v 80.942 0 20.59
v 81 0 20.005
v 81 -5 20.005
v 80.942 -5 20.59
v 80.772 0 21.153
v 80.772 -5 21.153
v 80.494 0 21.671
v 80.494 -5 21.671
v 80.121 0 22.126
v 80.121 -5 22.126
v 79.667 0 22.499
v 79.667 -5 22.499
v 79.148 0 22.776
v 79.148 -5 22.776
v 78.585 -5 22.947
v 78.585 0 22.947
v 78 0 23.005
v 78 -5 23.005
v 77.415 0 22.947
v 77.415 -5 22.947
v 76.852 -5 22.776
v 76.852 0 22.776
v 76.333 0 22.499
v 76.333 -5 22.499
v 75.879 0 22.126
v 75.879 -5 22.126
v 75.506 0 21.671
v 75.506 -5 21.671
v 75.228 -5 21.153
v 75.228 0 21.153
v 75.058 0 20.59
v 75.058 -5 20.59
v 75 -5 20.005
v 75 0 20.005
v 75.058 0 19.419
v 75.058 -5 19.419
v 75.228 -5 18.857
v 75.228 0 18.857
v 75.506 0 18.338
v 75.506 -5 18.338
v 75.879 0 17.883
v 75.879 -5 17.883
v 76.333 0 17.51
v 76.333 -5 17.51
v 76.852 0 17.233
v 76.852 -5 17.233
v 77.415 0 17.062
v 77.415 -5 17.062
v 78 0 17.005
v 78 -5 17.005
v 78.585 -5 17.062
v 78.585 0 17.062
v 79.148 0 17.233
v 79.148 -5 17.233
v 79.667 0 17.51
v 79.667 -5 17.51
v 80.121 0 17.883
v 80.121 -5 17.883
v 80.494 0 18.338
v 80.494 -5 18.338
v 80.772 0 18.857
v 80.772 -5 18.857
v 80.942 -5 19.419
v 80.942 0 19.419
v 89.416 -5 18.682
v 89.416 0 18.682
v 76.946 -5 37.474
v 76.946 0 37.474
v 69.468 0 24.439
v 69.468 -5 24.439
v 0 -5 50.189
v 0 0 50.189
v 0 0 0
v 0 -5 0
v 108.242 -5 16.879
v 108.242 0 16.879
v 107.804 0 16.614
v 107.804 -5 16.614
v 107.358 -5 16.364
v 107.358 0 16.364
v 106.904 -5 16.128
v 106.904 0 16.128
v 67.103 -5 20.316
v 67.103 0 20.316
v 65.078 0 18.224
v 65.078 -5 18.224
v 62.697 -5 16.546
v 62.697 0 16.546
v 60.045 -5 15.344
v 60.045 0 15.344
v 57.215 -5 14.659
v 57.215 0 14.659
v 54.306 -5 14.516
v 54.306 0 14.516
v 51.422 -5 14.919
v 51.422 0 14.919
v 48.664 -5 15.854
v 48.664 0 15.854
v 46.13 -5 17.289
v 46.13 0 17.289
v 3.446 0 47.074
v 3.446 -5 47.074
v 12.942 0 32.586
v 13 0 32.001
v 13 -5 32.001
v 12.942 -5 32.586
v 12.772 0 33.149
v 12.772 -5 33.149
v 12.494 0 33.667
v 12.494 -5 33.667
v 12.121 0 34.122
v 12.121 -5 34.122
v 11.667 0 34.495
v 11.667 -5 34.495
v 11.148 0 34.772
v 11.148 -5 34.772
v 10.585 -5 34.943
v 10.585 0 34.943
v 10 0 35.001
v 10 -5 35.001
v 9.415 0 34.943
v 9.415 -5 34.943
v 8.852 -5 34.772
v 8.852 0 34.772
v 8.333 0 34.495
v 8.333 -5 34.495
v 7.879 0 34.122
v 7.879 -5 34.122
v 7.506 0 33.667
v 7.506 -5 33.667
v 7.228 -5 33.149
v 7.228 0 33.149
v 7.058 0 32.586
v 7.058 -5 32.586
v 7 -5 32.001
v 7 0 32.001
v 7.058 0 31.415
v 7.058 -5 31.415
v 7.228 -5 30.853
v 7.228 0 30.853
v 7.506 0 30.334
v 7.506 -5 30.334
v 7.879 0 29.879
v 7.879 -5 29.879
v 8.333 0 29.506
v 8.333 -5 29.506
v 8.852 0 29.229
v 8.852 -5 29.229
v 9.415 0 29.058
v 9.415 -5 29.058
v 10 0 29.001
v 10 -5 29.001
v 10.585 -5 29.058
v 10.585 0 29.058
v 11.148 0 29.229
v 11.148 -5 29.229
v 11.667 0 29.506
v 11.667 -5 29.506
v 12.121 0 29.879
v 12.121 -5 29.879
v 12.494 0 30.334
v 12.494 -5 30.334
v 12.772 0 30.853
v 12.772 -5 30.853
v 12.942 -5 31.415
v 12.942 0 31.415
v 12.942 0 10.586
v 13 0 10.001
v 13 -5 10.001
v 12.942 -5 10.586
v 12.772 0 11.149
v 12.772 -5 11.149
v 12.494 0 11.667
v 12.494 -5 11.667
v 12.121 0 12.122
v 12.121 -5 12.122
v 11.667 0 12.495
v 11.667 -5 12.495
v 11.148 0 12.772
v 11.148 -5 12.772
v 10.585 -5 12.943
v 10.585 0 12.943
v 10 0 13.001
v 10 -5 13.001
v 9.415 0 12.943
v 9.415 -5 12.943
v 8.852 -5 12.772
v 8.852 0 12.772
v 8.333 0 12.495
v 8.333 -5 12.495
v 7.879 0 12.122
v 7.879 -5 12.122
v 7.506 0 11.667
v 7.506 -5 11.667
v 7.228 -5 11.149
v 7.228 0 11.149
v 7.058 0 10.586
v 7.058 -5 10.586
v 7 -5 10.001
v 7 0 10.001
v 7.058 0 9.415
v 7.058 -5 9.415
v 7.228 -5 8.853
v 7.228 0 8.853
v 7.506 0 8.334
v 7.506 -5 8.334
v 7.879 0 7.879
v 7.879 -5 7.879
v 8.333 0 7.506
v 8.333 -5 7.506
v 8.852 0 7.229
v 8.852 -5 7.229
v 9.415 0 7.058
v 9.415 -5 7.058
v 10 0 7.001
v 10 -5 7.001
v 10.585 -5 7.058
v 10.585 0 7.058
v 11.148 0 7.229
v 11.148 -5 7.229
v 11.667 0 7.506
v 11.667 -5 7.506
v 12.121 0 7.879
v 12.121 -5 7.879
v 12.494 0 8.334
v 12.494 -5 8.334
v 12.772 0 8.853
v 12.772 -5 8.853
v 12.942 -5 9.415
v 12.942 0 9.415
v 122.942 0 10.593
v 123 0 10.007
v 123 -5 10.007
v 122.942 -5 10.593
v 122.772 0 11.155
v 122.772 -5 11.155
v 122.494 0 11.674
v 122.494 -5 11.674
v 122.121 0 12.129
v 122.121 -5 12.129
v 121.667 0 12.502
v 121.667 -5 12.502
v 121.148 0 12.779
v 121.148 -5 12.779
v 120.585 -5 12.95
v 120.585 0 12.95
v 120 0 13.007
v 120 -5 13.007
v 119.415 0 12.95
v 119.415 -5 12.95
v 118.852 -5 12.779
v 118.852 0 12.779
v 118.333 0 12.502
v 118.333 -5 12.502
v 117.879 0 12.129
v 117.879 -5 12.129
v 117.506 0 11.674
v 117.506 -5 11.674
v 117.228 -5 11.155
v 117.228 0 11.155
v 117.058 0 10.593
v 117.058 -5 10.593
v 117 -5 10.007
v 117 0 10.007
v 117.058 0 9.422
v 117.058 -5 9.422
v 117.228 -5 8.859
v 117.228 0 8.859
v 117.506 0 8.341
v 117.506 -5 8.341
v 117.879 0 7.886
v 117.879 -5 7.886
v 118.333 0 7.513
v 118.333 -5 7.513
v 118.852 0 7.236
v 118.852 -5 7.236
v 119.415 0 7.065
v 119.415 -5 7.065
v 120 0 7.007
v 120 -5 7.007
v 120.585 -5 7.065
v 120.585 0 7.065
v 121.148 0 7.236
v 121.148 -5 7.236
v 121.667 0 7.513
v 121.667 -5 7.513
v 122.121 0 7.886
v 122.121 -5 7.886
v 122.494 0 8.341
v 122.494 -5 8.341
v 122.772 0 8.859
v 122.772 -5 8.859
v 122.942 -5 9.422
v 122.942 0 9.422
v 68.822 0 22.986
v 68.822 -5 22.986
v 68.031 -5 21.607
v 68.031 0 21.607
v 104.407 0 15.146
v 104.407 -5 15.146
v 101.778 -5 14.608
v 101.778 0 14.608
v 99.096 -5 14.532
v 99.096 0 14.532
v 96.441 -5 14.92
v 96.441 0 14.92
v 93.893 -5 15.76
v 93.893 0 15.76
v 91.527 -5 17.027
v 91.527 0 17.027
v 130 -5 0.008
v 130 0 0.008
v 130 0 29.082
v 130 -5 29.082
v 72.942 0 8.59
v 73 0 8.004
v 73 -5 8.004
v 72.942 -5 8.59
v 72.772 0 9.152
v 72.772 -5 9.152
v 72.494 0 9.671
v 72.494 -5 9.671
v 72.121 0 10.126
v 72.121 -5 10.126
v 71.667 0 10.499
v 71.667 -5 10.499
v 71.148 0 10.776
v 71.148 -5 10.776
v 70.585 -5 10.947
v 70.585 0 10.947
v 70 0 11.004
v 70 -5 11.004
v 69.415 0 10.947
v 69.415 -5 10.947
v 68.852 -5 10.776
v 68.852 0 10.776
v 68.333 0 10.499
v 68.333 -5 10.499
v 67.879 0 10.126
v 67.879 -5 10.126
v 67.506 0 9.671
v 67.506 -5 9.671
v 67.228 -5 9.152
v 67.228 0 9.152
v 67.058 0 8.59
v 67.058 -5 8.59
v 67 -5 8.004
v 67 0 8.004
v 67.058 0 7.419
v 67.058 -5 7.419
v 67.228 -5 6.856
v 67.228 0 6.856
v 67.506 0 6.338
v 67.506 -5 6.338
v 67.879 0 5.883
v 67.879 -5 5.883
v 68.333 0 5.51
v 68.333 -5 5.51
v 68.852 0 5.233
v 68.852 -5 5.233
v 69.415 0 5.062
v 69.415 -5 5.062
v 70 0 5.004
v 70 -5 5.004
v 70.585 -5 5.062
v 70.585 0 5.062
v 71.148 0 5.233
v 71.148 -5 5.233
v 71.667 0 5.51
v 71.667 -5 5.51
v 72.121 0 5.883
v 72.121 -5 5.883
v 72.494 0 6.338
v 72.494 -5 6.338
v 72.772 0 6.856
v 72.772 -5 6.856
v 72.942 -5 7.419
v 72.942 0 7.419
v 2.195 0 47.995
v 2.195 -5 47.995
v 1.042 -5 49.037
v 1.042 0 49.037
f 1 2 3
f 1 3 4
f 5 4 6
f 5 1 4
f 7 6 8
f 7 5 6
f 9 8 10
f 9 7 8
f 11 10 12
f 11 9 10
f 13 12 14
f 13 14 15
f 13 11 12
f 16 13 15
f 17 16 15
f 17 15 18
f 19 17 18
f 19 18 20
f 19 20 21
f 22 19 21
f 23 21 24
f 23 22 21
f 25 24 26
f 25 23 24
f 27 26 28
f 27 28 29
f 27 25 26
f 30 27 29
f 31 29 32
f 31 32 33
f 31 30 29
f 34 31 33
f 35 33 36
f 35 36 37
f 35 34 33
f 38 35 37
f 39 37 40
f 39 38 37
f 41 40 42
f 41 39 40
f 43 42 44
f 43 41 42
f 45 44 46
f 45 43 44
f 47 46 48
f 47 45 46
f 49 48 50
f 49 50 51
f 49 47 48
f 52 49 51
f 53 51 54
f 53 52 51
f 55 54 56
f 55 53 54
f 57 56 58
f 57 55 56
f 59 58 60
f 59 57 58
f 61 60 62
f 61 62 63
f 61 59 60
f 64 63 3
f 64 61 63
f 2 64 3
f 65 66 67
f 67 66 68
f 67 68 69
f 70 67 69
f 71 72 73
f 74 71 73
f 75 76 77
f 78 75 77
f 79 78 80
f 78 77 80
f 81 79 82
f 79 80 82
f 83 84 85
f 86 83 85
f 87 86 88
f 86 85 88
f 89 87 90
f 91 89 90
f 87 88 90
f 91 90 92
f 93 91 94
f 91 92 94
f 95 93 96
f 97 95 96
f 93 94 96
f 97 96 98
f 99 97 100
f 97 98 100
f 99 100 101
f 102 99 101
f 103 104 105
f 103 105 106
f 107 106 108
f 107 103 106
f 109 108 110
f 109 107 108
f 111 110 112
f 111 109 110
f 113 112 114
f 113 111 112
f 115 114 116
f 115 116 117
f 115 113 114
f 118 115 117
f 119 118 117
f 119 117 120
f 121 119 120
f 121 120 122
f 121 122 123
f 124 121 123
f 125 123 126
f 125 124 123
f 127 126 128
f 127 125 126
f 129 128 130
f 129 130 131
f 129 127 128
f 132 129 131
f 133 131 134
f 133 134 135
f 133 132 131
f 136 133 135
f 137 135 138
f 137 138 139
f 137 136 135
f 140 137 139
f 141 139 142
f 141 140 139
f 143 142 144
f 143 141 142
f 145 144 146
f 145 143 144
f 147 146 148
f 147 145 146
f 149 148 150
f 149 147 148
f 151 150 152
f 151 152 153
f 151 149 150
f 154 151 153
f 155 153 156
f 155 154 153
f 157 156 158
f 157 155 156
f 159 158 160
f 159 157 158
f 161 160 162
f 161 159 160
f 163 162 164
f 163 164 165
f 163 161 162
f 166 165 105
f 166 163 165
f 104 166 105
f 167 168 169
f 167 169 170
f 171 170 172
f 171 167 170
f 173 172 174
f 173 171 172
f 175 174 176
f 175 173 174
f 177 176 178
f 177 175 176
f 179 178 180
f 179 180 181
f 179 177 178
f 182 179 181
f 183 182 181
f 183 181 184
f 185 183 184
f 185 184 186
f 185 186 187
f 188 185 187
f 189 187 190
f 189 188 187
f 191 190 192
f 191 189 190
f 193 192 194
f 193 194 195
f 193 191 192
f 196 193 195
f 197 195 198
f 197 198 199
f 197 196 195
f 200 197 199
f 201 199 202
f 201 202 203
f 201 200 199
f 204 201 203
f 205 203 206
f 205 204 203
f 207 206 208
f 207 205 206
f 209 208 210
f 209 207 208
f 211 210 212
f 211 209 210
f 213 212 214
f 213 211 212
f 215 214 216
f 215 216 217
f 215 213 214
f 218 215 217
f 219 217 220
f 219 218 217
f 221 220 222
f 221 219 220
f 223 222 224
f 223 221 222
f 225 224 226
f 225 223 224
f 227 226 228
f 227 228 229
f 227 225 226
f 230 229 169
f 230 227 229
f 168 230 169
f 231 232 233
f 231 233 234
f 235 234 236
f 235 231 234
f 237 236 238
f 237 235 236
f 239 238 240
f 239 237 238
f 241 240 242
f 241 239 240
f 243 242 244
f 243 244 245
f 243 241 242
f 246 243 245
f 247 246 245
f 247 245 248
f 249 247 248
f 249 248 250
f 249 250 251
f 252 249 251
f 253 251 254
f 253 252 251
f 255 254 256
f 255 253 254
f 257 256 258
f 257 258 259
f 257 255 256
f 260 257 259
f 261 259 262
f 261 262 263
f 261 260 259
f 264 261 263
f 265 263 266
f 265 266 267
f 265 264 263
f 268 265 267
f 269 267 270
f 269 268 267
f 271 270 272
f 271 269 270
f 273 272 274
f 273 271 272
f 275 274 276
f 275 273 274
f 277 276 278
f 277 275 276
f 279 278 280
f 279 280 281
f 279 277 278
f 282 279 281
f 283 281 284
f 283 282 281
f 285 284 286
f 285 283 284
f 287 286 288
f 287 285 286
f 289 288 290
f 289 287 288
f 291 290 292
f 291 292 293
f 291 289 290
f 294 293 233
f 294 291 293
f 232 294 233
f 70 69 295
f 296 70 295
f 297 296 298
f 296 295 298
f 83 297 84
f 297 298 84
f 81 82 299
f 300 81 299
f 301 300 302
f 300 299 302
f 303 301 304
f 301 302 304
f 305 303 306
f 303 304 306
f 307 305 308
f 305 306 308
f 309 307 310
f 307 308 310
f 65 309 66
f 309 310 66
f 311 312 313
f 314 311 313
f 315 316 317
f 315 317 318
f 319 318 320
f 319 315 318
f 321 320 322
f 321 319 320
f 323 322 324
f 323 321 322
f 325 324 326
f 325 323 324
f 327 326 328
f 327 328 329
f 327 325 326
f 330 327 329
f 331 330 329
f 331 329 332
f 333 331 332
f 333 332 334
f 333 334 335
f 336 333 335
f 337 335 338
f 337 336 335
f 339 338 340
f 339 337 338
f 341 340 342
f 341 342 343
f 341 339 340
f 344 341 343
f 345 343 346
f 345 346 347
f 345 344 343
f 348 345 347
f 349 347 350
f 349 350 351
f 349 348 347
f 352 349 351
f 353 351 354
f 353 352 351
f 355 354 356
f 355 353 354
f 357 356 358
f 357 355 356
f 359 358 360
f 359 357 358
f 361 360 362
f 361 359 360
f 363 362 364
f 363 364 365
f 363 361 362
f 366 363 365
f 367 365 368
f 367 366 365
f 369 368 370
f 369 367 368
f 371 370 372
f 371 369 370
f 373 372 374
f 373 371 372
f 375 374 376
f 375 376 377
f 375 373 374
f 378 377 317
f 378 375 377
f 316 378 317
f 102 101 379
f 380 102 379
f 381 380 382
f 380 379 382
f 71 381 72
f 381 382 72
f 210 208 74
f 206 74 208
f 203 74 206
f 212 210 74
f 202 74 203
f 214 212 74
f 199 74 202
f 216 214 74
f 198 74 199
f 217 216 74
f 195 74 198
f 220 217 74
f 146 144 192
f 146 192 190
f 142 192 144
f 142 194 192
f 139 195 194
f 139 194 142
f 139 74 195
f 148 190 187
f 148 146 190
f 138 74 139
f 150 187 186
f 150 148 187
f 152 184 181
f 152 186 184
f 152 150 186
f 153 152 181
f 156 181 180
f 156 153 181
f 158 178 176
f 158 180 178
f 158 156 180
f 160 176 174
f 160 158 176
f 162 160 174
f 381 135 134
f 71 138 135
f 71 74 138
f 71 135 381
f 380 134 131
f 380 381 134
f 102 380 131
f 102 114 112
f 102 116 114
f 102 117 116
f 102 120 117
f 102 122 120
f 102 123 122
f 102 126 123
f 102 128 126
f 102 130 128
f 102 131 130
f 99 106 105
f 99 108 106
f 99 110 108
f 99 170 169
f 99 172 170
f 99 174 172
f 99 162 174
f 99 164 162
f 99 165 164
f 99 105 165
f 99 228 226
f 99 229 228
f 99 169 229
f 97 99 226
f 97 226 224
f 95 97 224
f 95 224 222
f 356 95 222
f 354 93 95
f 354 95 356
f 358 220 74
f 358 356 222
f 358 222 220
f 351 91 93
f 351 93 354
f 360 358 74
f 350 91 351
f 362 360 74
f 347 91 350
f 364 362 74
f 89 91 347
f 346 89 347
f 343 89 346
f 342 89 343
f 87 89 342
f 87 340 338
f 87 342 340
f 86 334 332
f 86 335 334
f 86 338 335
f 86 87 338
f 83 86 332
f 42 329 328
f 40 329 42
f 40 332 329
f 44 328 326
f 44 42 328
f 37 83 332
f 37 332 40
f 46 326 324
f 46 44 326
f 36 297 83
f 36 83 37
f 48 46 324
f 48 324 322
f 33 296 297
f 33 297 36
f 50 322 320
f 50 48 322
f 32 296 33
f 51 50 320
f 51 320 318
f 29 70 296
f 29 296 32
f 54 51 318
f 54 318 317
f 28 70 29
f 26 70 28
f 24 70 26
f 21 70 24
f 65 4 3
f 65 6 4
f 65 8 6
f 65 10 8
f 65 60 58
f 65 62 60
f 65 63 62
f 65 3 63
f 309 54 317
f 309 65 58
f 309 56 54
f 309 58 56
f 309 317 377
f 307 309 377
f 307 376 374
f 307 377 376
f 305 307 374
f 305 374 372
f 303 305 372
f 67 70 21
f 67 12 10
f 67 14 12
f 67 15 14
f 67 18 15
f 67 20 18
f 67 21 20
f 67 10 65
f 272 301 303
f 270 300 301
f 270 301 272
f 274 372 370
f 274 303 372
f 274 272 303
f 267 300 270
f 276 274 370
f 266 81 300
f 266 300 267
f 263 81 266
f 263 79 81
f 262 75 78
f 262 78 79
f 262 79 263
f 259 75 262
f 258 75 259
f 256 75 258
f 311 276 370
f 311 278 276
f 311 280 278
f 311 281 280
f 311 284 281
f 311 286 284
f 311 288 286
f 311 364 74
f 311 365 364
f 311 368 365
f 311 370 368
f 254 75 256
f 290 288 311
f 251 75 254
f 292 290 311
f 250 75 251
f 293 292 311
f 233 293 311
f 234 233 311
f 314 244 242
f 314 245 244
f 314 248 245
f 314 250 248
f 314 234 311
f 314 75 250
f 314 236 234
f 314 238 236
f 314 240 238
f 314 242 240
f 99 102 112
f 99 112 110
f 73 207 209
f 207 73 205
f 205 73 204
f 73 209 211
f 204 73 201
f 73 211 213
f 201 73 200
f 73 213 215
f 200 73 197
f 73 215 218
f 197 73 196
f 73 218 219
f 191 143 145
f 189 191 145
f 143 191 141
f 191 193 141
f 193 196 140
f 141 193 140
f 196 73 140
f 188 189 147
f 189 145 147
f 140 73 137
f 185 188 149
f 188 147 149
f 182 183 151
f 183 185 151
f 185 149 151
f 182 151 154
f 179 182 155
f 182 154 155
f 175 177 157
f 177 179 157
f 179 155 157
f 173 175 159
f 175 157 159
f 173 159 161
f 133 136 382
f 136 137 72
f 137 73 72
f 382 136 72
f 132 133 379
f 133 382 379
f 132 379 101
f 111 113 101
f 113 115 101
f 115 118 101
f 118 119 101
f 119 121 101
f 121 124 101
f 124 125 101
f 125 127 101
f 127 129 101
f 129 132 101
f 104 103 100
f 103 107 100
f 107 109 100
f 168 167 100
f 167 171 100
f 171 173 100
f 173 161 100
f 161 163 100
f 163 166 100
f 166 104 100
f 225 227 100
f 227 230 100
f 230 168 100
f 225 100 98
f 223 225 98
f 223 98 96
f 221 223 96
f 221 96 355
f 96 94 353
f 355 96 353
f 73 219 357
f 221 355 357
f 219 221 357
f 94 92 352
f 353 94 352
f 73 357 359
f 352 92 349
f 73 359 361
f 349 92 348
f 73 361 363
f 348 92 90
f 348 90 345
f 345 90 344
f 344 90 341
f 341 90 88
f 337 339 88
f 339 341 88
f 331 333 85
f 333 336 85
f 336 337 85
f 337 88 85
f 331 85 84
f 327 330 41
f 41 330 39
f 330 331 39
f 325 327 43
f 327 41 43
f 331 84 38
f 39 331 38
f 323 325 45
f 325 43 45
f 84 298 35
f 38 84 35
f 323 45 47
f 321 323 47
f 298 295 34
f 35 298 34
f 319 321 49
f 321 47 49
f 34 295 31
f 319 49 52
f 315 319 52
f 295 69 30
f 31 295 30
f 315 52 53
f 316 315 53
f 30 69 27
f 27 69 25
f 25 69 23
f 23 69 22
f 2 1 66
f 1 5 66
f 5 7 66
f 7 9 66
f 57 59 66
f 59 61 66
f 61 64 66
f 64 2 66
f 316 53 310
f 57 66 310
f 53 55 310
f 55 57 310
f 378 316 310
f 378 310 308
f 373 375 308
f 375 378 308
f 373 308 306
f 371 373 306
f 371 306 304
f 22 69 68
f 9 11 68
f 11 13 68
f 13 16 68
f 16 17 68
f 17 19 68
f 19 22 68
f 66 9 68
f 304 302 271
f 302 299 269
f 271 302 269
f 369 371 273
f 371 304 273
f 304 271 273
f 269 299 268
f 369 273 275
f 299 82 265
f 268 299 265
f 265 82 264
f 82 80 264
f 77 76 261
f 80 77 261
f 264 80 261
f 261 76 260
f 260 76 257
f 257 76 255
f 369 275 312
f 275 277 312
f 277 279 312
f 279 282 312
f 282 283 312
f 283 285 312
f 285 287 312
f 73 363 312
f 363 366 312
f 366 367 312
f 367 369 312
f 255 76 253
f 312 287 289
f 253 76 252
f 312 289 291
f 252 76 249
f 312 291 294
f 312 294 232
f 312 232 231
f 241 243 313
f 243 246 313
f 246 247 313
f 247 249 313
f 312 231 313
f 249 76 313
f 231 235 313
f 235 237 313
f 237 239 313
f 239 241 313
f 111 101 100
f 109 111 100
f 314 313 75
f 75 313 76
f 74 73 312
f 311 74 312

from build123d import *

# Parameters (mm, degrees)
F0_R     = 3
F1_DEPTH = 5


with BuildPart() as f1:
    # F0 (on Front) → F1 (new body)
    with BuildSketch(Plane.XZ):
        with BuildLine():
            Line((0, 50.189292), (0, 0))
            Line((0, 0), (130, 0.007858))
            Line((130, 0.007858), (130, 29.081571))
            Line((130, 29.081571), (108.241631, 16.878763))
            ThreePointArc((108.241631, 16.878763), (107.581922, 16.487004), (106.903636, 16.128371))
            ThreePointArc((106.903636, 16.128371), (97.760054, 14.668749), (89.415819, 18.682392))
            Line((89.415819, 18.682392), (76.946103, 37.473632))
            Line((76.946103, 37.473632), (69.468242, 24.439426))
            ThreePointArc((69.468242, 24.439426), (68.444533, 22.28673), (67.102852, 20.316458))
            ThreePointArc((67.102852, 20.316458), (57.214619, 14.659027), (46.130044, 17.288828))
            Line((46.130044, 17.288828), (3.445965, 47.074116))
            ThreePointArc((3.445965, 47.074116), (1.605618, 48.501877), (0, 50.189292))
        make_face()
        with Locations((10, 10.000604)):
            Circle(F0_R, mode=Mode.SUBTRACT)
        with Locations((70, 8.004231)):
            Circle(F0_R, mode=Mode.SUBTRACT)
        with Locations((120, 10.007253)):
            Circle(F0_R, mode=Mode.SUBTRACT)
        with Locations((78, 20.004715)):
            Circle(F0_R, mode=Mode.SUBTRACT)
        with Locations((10, 32.000605)):
            Circle(F0_R, mode=Mode.SUBTRACT)
    extrude(amount=F1_DEPTH)


solid = f1.part
